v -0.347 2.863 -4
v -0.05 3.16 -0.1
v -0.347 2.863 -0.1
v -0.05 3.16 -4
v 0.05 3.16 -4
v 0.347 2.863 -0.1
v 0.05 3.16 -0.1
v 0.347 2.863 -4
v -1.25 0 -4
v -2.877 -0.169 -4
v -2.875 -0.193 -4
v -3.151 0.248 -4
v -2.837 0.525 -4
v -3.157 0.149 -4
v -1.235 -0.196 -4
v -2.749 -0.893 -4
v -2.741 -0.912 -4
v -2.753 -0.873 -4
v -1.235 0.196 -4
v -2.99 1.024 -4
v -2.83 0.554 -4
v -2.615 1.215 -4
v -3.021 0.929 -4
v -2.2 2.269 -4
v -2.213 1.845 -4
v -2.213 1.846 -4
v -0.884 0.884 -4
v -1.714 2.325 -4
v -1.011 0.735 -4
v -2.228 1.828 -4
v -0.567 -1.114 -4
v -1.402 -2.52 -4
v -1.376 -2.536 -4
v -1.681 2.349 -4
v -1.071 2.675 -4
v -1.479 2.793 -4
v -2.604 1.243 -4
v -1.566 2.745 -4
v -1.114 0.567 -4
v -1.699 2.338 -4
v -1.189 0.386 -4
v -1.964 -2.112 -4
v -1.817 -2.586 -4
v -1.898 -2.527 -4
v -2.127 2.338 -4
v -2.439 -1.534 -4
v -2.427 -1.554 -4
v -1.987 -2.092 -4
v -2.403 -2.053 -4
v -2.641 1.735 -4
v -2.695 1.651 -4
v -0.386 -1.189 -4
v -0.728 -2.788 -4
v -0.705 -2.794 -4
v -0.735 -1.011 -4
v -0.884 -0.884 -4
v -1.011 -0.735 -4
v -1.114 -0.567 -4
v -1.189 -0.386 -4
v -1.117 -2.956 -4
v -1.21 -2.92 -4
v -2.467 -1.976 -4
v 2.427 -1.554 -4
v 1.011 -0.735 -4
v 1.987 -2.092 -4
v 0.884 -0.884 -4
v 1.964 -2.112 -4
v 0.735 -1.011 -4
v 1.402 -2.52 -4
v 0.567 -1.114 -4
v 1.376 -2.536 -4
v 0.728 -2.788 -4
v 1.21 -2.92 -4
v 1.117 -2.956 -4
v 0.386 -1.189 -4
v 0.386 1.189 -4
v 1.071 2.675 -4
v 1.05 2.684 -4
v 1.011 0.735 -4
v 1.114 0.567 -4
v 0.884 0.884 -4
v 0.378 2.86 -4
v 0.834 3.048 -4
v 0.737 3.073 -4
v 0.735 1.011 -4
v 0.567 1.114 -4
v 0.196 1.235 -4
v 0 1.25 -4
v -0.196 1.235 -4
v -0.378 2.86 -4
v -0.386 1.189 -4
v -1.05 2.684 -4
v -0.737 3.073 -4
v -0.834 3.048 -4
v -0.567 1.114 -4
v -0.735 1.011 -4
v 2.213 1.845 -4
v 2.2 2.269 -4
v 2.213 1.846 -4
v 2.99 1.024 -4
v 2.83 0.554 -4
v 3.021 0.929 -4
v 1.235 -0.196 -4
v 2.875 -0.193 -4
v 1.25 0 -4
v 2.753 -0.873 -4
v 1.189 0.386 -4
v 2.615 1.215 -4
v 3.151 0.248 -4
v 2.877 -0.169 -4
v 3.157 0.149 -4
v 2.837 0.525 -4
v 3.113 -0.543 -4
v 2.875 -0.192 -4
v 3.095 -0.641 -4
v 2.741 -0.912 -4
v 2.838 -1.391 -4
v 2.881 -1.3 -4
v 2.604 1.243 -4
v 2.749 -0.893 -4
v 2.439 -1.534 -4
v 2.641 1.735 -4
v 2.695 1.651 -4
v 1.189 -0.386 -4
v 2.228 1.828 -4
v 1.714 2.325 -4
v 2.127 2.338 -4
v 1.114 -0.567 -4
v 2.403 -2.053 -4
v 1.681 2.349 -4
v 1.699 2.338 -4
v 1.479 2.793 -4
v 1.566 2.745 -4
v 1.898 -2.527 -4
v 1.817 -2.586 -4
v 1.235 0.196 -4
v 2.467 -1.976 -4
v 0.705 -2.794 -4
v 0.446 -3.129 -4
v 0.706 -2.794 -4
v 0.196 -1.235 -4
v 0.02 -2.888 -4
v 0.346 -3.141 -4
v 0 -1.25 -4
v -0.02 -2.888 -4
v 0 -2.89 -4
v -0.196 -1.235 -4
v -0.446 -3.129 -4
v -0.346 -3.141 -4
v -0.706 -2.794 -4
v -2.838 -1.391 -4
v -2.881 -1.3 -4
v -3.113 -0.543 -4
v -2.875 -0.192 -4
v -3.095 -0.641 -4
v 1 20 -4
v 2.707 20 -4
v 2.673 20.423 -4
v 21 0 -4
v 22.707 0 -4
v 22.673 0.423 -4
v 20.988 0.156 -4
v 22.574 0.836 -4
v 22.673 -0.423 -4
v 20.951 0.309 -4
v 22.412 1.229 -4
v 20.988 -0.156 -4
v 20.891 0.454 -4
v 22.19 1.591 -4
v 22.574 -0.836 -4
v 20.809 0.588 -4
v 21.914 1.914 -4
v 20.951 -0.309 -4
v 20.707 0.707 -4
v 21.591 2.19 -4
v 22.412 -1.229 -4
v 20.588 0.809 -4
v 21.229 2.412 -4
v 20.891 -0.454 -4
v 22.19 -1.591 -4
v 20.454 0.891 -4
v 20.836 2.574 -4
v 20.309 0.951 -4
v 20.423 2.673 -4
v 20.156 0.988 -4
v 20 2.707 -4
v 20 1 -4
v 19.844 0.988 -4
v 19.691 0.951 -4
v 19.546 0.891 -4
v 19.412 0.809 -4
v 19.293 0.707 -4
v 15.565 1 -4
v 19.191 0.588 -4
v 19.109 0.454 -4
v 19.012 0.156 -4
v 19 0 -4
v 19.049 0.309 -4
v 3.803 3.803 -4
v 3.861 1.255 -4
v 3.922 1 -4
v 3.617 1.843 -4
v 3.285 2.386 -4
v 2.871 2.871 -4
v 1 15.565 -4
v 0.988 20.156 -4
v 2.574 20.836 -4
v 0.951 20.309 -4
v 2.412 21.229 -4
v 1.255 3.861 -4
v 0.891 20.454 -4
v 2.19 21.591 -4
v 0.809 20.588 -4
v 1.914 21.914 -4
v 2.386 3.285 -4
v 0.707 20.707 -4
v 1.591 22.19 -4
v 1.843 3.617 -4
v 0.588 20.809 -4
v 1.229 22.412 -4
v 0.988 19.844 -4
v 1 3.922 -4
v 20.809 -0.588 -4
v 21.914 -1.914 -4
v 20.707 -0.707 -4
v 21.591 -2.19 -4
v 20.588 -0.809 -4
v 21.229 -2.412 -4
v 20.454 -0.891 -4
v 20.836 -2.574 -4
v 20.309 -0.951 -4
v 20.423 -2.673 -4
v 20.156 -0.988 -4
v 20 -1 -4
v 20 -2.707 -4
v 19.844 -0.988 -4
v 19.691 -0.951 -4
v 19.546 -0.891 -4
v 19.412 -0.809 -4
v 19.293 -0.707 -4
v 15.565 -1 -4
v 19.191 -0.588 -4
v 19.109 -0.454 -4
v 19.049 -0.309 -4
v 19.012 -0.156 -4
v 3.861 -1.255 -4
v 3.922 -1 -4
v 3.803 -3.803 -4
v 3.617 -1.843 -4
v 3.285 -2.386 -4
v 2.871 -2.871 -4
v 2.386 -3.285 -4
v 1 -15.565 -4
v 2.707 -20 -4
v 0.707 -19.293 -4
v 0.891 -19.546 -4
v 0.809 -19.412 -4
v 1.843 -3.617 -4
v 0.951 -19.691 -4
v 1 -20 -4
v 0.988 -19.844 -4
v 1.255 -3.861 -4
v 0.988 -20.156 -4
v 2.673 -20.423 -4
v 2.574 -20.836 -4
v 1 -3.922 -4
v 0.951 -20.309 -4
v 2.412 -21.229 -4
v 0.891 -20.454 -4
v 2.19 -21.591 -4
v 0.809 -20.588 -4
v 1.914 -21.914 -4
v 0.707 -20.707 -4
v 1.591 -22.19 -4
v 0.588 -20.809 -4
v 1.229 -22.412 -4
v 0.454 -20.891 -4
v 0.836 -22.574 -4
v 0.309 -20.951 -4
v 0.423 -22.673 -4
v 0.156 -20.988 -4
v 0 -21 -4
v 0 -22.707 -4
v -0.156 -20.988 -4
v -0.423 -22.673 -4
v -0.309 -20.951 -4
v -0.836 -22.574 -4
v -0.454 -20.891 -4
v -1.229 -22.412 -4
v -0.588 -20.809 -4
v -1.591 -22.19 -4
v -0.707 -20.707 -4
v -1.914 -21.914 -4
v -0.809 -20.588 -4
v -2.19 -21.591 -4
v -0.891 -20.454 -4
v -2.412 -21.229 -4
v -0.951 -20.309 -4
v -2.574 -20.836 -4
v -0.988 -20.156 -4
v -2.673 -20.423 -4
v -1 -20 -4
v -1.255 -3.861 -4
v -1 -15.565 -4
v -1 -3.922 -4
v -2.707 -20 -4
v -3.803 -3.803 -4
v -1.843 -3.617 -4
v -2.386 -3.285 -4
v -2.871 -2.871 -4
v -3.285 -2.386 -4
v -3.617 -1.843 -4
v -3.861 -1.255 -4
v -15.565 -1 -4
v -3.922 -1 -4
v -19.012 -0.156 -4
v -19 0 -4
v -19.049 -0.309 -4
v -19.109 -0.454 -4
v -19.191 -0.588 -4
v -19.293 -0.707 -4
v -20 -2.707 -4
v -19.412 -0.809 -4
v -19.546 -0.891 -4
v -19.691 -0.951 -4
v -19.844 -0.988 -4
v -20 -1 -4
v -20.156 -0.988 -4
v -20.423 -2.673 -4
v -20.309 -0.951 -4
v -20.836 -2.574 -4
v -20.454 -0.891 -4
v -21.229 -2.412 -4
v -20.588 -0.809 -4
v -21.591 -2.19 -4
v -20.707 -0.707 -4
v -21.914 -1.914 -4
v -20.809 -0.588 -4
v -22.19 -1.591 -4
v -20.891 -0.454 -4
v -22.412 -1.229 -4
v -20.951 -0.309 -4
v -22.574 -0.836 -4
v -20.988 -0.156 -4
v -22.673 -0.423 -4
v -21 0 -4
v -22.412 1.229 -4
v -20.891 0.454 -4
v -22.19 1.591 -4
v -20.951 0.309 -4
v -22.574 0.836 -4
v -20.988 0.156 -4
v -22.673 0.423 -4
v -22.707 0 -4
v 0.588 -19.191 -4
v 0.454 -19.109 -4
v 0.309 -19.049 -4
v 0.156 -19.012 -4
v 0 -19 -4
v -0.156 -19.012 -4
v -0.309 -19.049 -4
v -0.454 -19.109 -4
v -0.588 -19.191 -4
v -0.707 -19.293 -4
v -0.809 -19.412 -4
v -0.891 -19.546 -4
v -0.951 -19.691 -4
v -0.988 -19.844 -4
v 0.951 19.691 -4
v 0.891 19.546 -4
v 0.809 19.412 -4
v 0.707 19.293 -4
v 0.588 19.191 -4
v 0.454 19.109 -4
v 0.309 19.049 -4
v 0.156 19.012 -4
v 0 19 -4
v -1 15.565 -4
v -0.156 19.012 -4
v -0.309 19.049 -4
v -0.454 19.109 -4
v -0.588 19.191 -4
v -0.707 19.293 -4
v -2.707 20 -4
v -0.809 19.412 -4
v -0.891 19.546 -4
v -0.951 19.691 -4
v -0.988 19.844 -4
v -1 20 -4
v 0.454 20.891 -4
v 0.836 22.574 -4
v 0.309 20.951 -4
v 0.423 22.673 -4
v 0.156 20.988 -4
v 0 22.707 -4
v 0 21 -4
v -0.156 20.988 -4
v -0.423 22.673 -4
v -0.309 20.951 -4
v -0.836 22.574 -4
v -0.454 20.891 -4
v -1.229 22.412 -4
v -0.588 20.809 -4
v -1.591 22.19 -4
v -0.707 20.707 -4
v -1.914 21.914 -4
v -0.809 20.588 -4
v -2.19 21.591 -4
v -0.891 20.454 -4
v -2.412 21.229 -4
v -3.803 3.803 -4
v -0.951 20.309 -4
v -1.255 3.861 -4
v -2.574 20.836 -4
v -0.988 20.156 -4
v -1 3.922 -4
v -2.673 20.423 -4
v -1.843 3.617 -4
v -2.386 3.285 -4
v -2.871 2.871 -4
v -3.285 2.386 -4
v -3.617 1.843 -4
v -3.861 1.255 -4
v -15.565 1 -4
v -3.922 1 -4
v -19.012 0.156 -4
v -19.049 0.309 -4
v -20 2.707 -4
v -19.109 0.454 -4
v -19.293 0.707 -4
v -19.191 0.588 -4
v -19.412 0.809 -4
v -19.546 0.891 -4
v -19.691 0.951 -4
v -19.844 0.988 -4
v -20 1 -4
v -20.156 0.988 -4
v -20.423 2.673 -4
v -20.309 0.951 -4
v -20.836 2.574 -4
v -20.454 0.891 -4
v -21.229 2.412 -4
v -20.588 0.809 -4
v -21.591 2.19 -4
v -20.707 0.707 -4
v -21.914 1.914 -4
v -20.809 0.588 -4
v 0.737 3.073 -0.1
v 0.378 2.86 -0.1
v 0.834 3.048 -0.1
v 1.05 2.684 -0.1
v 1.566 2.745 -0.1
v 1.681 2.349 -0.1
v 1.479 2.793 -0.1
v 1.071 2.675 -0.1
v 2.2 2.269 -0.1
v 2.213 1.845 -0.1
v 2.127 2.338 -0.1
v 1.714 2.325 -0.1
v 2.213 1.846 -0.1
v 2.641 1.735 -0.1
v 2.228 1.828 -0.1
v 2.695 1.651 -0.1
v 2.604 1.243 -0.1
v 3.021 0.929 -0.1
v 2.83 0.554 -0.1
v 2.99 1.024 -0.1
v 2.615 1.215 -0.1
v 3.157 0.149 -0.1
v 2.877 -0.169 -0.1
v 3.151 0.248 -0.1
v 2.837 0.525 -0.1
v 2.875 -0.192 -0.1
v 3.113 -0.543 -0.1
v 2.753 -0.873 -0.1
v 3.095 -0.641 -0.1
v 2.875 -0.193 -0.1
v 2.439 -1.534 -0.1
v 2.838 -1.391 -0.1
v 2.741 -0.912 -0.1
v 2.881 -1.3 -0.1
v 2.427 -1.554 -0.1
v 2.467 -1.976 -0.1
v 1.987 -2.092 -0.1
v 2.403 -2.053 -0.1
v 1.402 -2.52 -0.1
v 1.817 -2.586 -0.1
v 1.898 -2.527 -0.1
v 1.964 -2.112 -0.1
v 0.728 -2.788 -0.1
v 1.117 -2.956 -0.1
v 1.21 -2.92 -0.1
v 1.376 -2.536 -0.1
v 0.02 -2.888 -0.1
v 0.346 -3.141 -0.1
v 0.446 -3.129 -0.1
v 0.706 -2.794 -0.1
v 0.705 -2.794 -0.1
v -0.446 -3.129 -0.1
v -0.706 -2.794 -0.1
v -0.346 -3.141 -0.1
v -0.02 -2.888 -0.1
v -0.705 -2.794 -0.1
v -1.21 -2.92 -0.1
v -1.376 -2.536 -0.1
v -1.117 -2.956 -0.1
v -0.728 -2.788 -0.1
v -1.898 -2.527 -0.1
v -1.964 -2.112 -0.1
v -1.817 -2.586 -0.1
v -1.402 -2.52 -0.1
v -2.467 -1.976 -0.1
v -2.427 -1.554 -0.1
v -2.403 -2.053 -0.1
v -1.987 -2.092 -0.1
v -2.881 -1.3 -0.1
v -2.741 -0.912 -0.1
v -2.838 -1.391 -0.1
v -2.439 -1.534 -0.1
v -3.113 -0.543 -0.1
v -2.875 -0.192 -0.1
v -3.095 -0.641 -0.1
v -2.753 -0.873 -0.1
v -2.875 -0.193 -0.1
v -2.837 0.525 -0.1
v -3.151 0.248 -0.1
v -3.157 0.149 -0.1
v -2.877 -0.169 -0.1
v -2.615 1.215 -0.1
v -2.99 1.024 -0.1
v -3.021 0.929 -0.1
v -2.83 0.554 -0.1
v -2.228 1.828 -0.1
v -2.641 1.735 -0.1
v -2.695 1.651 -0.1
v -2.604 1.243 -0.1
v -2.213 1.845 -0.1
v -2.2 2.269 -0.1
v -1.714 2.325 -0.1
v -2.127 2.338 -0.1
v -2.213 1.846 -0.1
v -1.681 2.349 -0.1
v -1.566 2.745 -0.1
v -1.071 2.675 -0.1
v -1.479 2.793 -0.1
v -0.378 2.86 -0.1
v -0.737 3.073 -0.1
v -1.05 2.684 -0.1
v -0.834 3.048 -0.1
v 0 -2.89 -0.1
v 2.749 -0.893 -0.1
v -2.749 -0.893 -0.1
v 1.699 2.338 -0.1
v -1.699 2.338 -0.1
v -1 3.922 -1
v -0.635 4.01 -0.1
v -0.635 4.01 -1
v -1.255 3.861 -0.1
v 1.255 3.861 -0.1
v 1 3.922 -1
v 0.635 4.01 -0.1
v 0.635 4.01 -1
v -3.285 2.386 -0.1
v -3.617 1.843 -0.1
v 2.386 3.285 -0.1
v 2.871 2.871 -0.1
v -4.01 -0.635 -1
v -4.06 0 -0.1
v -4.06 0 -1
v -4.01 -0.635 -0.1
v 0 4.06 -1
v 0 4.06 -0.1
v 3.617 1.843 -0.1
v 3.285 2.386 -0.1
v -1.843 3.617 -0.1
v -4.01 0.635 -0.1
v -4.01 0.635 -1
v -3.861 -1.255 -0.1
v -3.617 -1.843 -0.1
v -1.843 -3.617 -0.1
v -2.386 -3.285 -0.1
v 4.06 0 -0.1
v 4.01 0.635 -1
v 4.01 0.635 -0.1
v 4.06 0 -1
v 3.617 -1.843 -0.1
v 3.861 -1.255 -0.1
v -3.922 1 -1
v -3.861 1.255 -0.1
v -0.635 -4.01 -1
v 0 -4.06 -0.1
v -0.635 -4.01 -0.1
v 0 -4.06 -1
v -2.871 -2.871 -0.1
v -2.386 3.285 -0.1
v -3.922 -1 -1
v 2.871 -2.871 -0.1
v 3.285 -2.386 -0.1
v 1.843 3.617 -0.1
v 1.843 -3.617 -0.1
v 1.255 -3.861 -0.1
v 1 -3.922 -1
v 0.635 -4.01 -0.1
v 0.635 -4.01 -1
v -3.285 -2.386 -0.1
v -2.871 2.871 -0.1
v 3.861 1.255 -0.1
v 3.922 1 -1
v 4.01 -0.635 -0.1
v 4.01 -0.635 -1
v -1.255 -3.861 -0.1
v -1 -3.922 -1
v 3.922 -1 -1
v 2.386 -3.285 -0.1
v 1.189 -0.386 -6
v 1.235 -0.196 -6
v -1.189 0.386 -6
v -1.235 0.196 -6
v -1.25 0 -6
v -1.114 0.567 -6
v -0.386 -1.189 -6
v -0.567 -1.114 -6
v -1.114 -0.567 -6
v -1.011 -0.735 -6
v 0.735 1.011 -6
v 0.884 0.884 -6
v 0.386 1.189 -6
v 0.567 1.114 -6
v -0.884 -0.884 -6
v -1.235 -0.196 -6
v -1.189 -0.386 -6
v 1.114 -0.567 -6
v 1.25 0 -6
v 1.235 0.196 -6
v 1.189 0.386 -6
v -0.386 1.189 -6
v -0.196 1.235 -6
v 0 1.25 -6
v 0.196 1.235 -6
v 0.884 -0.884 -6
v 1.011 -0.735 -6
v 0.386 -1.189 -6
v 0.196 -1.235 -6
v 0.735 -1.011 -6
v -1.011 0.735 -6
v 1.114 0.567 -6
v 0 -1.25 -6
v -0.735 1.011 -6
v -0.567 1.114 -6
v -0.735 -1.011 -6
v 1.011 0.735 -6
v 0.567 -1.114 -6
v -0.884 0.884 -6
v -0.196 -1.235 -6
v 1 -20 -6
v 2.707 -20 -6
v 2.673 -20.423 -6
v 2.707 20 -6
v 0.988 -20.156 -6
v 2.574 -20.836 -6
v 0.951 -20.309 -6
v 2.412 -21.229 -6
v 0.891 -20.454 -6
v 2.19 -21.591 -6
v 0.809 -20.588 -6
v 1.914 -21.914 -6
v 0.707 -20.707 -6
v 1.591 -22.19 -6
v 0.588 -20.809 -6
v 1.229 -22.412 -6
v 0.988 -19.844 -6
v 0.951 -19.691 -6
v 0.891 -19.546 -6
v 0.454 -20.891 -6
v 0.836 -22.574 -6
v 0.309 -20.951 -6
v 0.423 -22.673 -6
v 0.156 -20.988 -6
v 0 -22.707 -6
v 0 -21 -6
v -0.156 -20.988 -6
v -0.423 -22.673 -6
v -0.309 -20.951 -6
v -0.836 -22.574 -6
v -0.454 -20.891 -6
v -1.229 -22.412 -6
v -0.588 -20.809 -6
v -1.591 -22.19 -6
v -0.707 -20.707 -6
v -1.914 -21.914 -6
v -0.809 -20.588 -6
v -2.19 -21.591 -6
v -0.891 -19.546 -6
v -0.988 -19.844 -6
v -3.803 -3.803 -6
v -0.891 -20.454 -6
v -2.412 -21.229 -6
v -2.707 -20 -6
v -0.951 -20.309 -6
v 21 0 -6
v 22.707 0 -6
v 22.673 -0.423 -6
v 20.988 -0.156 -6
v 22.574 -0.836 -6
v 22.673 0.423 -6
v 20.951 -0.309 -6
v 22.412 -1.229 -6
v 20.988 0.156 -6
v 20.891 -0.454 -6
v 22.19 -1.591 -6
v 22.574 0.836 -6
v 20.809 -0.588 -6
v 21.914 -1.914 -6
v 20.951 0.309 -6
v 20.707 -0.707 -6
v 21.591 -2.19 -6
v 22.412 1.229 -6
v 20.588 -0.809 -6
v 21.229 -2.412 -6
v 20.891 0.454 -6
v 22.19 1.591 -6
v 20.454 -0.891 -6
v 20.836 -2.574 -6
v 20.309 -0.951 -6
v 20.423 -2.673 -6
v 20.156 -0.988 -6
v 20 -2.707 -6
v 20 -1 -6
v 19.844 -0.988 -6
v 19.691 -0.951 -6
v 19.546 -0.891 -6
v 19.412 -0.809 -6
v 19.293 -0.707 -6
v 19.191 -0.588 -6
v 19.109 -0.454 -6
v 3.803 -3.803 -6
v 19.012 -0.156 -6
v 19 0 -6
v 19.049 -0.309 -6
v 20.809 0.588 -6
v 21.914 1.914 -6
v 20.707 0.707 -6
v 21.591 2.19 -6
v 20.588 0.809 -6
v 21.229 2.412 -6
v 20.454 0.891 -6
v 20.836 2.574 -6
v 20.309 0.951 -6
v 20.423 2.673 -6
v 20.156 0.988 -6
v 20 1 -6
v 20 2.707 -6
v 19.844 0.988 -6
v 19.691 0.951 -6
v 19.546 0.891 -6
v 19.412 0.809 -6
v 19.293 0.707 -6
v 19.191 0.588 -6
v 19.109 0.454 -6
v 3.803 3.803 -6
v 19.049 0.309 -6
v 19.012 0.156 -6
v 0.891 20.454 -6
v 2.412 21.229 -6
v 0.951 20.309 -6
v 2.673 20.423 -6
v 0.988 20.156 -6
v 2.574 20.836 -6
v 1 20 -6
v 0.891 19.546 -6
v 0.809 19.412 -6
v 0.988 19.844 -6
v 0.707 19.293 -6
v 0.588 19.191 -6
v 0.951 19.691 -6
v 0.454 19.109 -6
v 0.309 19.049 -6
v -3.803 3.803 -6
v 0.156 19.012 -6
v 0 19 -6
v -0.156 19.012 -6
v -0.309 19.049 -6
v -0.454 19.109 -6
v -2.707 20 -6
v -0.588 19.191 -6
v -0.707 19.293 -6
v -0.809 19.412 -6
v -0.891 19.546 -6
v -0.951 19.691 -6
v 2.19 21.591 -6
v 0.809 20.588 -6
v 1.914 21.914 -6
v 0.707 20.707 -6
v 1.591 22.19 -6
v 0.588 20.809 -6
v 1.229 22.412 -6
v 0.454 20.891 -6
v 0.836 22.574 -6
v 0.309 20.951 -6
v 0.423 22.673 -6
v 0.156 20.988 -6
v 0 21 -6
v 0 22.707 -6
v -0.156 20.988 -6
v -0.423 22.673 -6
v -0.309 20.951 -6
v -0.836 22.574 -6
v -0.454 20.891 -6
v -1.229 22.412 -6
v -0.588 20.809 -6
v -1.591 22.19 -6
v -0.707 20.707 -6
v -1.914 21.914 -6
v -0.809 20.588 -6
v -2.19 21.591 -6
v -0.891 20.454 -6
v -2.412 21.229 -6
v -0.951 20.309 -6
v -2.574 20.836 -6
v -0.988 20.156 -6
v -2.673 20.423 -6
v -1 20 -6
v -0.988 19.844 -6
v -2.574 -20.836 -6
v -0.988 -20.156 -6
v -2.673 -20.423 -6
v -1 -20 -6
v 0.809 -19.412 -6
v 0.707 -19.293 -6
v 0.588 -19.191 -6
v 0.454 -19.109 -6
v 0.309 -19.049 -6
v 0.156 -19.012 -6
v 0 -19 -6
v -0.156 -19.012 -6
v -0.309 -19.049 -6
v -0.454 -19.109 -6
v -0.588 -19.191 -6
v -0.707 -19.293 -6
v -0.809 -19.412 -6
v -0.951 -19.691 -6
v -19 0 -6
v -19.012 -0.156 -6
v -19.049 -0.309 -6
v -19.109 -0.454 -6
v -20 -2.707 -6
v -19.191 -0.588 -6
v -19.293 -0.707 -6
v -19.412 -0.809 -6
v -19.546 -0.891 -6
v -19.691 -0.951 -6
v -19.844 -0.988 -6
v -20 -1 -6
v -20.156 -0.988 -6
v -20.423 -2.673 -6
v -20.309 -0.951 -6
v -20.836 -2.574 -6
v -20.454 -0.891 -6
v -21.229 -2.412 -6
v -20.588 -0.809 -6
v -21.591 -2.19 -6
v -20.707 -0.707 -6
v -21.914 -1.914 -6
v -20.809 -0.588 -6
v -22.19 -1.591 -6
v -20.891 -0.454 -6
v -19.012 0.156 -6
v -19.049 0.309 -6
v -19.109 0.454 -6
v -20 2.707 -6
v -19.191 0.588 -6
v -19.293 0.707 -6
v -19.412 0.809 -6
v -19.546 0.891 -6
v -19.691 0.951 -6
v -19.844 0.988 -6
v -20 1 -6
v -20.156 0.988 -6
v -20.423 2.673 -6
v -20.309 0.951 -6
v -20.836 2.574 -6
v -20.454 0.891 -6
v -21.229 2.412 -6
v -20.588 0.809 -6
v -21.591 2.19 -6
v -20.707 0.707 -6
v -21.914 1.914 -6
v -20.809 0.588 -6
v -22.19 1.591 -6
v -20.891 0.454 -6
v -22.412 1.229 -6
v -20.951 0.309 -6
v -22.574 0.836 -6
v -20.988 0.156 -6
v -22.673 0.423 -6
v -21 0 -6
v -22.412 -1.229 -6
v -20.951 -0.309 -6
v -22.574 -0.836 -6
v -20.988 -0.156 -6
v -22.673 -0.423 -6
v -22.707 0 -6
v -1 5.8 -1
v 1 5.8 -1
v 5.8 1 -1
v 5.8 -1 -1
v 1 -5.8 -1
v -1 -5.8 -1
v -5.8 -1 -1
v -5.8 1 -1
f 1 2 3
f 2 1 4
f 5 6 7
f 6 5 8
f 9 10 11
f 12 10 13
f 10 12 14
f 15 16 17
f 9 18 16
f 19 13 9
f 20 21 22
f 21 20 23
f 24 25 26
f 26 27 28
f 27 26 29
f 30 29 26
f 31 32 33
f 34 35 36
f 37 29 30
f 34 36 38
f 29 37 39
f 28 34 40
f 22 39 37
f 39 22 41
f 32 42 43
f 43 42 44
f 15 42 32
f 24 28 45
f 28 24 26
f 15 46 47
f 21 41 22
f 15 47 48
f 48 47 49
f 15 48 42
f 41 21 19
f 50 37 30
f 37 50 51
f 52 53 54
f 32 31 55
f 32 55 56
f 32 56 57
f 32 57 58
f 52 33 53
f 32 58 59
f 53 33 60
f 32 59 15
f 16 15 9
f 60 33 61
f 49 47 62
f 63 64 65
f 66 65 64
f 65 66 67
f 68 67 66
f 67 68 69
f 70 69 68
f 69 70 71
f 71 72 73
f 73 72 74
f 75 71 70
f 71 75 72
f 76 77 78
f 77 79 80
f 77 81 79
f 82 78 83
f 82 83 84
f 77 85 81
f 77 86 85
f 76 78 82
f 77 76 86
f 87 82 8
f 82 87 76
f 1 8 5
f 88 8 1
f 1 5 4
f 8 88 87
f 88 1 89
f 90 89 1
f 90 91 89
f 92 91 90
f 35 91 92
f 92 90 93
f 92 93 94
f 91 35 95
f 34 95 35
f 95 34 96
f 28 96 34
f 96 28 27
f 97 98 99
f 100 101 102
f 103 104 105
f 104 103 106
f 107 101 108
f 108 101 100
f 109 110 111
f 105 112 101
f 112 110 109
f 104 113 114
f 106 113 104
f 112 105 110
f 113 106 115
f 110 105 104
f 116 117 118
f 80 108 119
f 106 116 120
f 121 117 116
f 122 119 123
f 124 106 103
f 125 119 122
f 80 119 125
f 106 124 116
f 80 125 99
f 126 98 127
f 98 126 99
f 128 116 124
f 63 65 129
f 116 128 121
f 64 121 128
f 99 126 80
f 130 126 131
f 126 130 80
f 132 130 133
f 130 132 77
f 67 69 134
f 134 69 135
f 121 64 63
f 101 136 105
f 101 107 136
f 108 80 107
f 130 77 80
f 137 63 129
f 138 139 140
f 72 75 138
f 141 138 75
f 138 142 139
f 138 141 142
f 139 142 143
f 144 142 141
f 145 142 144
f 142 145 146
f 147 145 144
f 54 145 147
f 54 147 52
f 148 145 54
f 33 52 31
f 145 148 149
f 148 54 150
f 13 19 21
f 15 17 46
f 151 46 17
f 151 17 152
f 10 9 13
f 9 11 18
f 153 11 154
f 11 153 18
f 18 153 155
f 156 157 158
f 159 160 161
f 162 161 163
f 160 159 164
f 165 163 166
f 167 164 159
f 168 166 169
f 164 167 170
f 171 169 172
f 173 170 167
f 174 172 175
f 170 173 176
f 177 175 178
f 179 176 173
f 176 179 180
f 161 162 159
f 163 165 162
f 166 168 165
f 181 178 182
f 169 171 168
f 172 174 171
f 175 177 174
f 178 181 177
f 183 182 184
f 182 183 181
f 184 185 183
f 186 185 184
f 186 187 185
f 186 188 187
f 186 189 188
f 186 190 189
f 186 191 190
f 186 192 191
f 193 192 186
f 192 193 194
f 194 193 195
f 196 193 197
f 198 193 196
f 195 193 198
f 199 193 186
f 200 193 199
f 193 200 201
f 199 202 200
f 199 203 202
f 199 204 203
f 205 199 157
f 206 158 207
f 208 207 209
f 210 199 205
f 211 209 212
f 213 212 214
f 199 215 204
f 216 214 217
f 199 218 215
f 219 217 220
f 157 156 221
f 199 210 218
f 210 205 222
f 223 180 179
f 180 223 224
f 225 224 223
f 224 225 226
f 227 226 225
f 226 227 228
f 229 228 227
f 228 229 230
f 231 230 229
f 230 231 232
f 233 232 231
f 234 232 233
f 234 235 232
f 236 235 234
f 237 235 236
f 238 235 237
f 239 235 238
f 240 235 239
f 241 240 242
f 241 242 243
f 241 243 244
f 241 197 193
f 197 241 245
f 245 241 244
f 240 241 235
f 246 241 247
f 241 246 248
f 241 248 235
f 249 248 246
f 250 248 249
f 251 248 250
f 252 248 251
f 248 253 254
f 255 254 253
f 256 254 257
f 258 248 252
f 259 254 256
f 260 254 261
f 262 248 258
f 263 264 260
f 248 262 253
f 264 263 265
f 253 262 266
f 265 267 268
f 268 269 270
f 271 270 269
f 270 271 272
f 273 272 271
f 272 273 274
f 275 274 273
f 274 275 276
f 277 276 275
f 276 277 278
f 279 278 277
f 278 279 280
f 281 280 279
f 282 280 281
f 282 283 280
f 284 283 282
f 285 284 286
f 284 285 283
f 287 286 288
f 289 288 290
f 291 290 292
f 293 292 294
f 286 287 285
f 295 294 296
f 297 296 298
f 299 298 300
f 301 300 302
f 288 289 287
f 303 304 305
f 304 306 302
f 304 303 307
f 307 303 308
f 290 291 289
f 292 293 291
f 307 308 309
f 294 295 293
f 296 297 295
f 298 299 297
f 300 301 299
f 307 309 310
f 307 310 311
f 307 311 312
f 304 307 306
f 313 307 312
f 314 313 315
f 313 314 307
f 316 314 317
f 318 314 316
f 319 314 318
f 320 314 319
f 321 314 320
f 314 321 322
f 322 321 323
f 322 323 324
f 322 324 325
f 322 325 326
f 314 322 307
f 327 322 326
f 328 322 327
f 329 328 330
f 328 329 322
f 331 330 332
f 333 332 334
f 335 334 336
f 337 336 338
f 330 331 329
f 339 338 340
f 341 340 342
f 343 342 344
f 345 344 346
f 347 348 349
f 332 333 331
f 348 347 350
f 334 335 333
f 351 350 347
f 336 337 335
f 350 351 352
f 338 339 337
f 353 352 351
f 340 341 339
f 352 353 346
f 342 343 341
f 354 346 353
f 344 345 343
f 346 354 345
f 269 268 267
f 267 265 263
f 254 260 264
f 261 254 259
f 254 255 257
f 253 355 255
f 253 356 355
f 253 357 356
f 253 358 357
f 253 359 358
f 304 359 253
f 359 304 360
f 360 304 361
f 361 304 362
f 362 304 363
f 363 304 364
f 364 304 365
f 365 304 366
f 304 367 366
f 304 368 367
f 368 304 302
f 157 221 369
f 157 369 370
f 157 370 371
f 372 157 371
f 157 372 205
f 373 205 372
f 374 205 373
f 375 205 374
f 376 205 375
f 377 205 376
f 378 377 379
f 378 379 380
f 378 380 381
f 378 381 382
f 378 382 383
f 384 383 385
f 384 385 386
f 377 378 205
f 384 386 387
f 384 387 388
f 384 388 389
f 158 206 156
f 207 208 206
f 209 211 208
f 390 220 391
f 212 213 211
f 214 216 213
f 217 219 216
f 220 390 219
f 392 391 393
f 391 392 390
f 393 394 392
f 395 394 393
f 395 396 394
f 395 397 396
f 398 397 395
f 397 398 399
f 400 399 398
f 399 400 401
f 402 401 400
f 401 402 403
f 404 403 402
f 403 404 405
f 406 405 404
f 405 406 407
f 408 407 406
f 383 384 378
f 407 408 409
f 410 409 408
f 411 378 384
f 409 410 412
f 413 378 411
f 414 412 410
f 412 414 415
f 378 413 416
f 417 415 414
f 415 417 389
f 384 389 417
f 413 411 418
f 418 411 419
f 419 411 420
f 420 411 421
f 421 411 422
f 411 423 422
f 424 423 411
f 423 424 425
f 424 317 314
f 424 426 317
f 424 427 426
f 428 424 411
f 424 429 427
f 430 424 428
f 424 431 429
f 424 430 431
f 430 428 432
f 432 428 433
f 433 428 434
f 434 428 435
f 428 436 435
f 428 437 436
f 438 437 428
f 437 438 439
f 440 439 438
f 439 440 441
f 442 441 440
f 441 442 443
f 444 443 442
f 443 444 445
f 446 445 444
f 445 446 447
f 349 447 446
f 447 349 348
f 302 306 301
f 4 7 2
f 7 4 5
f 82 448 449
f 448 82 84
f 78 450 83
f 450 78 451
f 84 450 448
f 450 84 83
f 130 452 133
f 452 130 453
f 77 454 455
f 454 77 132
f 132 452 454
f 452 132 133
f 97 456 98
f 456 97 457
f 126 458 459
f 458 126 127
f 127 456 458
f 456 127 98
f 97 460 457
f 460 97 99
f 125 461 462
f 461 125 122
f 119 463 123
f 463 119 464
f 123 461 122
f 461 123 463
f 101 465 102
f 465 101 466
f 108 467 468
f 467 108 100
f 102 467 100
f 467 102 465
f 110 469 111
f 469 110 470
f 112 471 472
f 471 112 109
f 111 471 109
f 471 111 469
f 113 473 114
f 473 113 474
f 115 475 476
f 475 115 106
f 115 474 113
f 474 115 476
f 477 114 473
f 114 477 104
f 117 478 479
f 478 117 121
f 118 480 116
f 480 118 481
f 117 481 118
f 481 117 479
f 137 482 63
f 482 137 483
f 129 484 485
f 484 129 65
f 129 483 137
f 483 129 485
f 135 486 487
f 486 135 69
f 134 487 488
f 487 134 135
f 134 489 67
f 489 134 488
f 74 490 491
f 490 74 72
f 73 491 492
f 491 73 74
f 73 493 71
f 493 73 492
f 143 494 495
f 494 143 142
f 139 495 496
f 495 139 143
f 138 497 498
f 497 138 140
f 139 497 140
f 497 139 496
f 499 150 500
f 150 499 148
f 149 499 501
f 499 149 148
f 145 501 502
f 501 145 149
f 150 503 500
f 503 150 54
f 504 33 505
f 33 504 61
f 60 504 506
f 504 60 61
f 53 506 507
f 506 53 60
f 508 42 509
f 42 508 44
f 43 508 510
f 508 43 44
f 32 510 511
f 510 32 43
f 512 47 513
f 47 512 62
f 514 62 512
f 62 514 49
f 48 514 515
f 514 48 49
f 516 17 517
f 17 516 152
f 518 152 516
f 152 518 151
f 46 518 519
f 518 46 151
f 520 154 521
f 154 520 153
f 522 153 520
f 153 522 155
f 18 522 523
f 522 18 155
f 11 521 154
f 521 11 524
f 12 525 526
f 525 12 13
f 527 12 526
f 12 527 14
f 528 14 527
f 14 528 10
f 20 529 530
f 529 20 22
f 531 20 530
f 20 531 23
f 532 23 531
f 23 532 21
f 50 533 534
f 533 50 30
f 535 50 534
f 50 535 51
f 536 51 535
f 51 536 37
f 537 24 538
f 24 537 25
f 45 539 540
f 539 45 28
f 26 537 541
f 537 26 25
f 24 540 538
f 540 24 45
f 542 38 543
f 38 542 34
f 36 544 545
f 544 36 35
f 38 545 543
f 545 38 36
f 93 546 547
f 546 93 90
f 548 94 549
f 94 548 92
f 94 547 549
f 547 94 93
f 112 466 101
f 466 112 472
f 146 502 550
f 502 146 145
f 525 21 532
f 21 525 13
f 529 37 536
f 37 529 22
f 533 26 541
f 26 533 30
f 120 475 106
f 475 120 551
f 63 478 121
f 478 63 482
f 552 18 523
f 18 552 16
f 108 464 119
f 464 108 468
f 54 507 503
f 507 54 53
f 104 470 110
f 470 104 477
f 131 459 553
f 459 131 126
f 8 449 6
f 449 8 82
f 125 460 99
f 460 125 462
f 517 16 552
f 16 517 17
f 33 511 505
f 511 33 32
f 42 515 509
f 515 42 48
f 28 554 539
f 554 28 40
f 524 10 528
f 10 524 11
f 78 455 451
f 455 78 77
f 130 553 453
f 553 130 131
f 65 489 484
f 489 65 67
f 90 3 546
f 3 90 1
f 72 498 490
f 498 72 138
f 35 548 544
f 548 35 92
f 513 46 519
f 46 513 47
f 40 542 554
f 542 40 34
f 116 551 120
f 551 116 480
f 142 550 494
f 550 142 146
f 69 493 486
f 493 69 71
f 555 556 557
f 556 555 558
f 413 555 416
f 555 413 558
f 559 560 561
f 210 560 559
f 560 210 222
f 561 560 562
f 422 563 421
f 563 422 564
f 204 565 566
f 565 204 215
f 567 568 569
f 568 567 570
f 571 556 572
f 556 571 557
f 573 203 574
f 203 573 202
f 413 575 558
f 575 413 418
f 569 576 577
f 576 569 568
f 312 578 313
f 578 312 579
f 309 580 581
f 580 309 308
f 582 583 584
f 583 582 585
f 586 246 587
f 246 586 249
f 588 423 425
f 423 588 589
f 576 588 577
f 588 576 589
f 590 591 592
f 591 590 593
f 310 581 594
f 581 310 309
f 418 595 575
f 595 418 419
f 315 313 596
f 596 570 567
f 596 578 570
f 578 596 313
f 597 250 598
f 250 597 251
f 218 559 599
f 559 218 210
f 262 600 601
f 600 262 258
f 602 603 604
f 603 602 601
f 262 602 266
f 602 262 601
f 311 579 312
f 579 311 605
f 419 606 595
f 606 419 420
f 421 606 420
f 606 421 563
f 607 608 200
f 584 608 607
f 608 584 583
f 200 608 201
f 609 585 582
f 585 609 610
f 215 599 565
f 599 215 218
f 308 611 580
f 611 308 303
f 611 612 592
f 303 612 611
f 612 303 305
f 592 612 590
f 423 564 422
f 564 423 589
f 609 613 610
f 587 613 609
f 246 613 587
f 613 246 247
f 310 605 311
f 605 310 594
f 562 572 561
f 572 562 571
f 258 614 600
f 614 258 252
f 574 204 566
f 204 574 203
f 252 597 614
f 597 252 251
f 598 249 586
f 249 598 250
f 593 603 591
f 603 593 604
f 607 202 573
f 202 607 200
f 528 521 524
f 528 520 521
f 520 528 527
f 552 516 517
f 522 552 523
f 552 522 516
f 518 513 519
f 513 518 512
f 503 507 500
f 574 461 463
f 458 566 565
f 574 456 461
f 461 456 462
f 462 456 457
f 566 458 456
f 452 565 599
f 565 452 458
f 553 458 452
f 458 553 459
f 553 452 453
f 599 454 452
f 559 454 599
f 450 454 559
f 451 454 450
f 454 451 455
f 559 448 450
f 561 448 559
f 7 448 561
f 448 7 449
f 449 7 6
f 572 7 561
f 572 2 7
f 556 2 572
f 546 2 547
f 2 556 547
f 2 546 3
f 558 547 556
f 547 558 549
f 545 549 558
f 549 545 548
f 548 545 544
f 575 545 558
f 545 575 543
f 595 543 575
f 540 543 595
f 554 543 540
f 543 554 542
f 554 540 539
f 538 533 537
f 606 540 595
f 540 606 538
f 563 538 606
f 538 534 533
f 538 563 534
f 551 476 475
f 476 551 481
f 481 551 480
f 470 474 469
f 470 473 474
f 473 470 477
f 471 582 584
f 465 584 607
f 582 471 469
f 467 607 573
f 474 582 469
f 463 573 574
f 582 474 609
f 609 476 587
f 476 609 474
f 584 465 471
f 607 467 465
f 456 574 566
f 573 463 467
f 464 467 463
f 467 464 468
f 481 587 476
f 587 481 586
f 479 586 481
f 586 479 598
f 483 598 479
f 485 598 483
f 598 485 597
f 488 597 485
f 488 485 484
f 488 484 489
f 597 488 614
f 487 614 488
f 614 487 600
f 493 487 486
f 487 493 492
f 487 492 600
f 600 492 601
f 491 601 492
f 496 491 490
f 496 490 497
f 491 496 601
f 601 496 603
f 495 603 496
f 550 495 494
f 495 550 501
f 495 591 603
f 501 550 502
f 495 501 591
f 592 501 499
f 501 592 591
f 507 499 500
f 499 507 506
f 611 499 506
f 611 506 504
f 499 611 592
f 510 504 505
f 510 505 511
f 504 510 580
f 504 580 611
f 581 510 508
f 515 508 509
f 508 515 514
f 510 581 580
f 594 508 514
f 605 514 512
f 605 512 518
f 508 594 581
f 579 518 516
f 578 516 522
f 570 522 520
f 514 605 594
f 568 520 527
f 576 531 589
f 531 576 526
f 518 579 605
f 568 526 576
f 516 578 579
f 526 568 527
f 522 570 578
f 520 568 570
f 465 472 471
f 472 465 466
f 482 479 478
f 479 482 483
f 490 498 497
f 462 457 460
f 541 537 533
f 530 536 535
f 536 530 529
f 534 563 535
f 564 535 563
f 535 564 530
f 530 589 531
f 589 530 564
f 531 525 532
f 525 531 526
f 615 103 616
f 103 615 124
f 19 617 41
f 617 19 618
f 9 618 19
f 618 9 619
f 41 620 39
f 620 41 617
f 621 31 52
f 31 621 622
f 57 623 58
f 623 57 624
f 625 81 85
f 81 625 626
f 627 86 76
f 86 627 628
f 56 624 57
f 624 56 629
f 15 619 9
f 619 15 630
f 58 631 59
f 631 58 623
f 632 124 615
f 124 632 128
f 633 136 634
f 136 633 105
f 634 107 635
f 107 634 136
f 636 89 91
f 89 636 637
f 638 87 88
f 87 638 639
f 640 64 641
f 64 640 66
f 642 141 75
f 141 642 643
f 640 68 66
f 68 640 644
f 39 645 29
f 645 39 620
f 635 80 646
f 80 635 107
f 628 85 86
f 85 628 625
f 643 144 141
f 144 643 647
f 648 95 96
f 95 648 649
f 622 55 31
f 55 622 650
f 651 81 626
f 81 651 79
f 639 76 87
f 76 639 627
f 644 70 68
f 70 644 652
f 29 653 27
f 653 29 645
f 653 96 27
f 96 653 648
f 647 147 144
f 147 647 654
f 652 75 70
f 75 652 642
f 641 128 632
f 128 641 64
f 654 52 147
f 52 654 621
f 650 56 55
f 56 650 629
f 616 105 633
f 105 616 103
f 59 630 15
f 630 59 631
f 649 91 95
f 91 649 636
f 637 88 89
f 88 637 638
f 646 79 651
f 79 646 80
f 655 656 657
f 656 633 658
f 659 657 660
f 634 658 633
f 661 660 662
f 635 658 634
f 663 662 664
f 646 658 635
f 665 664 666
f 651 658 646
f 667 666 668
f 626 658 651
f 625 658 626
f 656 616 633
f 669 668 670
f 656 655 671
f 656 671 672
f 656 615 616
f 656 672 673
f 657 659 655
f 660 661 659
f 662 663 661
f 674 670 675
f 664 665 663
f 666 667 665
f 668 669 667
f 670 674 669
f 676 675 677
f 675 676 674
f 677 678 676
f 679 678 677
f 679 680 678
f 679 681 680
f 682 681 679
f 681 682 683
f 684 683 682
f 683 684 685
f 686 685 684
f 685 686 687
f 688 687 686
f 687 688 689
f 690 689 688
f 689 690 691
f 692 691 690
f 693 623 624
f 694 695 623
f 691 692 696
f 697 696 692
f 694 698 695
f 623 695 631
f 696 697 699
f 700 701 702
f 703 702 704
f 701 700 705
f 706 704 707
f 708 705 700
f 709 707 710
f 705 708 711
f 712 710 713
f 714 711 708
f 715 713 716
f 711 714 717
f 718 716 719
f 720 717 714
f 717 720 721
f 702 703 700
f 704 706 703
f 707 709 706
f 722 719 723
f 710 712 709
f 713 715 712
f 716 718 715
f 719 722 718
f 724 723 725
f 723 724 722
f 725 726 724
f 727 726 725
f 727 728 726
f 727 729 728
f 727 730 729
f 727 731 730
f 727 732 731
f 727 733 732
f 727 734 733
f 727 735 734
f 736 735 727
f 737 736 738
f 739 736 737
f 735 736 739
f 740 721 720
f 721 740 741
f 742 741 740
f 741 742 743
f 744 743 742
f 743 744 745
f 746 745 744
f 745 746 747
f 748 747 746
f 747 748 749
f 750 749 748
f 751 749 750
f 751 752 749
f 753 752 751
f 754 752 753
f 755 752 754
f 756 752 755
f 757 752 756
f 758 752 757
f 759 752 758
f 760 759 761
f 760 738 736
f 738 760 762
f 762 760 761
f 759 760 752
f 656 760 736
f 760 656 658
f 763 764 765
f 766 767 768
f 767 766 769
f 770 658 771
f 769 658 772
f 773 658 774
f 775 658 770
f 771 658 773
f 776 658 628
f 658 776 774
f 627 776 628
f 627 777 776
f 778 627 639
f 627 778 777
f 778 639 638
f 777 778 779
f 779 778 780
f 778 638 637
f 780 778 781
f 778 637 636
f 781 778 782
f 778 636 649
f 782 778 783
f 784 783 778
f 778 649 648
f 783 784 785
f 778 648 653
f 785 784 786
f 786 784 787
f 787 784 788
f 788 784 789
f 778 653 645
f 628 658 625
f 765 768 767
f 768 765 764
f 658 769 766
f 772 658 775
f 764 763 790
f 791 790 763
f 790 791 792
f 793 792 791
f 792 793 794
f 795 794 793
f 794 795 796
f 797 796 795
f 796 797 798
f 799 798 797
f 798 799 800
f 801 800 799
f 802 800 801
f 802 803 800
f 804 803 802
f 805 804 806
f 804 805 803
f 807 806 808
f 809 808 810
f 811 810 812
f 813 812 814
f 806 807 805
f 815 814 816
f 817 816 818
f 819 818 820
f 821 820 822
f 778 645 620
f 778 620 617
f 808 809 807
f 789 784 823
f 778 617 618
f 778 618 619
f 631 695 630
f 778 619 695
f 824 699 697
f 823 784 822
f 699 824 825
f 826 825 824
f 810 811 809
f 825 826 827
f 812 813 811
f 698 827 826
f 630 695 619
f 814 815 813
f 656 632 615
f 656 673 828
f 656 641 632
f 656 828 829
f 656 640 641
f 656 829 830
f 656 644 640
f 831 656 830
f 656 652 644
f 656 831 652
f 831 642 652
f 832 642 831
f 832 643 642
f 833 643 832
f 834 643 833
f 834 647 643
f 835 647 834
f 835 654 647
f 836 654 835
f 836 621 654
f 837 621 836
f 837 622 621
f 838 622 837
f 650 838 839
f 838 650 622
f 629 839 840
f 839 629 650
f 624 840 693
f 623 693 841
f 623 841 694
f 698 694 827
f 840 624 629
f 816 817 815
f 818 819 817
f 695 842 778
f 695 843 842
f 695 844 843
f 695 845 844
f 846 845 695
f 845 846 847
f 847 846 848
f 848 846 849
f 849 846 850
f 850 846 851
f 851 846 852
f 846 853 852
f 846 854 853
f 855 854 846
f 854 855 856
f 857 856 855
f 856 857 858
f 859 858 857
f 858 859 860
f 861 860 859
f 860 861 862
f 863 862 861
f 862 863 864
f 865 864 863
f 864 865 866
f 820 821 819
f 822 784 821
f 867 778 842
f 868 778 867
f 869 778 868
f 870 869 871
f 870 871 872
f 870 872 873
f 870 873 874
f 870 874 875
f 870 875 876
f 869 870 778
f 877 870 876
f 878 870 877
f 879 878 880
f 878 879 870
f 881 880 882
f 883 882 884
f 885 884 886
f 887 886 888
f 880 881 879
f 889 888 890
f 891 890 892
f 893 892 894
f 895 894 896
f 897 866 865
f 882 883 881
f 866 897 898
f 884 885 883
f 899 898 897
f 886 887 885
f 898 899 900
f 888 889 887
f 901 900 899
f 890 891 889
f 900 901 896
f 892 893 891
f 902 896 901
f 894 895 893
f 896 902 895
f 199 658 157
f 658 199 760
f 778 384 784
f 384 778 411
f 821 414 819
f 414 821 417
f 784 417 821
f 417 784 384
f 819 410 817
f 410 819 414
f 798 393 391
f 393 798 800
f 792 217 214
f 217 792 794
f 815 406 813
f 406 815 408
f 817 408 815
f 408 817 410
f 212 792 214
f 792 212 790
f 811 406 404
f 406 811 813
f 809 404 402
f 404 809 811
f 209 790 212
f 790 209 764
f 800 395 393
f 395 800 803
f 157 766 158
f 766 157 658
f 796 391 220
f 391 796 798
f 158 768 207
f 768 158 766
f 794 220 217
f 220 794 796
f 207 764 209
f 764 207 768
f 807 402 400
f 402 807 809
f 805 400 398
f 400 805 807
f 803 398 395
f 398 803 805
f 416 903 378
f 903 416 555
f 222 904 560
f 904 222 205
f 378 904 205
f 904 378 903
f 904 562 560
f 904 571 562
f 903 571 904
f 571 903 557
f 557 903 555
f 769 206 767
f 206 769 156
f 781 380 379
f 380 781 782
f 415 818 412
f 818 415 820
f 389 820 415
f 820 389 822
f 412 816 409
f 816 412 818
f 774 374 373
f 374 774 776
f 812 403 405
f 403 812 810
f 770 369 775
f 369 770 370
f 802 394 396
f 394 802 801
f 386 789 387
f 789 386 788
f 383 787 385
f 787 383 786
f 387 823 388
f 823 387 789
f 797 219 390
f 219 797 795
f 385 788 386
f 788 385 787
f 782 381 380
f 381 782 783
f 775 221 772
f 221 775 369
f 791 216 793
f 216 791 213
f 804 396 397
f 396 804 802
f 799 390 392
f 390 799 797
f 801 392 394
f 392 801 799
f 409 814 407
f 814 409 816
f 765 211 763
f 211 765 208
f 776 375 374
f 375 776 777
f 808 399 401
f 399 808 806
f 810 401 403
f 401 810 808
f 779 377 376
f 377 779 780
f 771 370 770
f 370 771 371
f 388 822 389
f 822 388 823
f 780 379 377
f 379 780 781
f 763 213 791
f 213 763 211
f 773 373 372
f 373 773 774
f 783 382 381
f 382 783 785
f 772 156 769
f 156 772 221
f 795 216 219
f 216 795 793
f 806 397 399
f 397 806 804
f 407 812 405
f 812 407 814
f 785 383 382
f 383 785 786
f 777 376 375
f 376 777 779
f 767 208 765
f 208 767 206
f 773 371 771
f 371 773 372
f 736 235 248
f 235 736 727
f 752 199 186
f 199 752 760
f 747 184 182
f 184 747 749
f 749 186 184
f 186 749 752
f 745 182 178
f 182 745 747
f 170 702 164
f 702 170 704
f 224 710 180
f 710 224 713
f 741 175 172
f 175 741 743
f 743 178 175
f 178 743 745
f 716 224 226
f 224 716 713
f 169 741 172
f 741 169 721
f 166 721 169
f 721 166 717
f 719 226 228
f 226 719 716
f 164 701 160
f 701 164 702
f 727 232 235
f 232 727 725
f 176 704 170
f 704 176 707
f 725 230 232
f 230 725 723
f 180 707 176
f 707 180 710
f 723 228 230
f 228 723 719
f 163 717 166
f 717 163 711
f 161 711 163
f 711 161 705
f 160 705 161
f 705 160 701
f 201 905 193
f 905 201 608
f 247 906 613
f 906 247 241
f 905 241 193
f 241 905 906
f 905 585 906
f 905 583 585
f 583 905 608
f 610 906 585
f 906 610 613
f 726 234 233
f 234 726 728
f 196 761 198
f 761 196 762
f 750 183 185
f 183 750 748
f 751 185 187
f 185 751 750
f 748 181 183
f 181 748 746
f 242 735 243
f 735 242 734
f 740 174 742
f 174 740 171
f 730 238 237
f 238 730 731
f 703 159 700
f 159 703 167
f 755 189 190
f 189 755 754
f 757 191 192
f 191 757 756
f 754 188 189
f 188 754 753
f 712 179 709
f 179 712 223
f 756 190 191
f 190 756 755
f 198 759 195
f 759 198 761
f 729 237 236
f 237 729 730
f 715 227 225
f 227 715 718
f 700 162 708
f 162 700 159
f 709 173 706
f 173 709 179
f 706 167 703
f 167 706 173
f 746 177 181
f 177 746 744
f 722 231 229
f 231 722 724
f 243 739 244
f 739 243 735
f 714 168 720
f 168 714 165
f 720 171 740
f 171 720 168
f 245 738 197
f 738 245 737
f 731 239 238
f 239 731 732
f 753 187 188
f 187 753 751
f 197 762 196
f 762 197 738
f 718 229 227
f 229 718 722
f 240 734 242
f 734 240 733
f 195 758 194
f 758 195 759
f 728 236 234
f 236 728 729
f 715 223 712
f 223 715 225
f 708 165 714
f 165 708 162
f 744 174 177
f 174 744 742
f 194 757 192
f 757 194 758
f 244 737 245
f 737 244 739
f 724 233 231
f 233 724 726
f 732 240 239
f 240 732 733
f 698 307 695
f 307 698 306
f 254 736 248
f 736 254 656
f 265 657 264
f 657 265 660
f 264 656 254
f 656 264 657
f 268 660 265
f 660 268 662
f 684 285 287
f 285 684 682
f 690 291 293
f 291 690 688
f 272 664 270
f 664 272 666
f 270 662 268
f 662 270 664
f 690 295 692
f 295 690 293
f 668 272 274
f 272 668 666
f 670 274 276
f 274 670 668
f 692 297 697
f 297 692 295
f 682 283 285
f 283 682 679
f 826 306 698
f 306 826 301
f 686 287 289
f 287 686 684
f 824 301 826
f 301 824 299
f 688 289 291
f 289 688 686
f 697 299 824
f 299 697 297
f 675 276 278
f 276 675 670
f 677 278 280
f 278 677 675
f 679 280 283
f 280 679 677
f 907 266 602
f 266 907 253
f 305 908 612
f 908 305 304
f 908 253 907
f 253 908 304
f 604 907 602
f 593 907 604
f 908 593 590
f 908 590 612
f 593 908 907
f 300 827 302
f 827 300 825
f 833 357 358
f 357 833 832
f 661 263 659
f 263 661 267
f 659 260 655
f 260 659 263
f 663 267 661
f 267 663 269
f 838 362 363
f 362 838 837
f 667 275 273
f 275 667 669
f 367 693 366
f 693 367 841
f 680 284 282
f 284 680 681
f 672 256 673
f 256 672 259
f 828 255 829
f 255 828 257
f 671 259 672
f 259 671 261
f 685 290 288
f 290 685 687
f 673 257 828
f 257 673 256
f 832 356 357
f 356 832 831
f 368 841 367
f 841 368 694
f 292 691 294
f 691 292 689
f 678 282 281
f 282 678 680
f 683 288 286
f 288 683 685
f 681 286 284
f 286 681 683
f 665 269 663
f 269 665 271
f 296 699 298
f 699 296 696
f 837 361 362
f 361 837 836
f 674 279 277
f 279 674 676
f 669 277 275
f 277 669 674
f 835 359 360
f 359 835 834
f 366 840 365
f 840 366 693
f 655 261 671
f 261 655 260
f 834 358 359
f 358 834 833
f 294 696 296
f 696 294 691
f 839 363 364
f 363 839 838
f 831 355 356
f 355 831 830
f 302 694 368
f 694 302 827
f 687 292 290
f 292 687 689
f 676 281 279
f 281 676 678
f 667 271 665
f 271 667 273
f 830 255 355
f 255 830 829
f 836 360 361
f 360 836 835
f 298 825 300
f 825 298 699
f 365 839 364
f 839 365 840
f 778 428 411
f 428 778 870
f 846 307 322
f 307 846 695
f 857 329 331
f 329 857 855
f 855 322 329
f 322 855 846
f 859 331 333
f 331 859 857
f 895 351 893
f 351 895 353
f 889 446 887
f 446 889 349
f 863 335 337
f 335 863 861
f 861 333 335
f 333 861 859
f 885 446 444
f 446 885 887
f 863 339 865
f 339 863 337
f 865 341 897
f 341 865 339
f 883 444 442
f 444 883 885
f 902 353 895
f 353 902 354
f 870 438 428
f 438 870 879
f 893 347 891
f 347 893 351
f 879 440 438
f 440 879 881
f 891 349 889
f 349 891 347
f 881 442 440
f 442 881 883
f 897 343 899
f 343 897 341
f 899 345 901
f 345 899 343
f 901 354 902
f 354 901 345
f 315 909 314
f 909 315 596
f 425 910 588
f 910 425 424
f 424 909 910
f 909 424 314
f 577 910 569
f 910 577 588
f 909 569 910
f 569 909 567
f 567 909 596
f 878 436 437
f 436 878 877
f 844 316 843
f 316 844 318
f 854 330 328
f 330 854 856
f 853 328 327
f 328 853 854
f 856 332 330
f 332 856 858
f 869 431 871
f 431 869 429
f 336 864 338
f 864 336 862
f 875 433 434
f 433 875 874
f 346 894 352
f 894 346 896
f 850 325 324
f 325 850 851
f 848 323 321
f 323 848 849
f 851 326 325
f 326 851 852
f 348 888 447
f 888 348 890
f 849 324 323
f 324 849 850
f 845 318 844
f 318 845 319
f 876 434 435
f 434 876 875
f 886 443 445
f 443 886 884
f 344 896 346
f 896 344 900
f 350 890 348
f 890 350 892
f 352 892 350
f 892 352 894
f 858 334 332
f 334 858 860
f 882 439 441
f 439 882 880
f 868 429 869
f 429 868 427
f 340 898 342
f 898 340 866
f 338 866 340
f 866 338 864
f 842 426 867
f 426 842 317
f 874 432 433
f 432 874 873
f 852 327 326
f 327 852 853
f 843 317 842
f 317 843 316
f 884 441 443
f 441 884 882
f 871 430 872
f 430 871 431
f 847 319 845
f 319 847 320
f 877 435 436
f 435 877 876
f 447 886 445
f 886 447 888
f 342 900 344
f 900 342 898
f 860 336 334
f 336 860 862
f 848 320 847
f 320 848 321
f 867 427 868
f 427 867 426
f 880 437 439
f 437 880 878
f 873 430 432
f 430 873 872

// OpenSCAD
/**
 *  Parametric servo arm generator for OpenScad
 *  Générateur de palonnier de servo pour OpenScad
 *
 *  Copyright (c) 2012 Charles Rincheval.  All rights reserved.
 *
 *  This library is free software; you can redistribute it and/or
 *  modify it under the terms of the GNU Lesser General Public
 *  License as published by the Free Software Foundation; either
 *  version 2.1 of the License, or (at your option) any later version.
 *
 *  This library is distributed in the hope that it will be useful,
 *  but WITHOUT ANY WARRANTY; without even the implied warranty of
 *  MERCHANTABILITY or FITNESS FOR A PARTICULAR PURPOSE.  See the GNU
 *  Lesser General Public License for more details.
 *
 *  You should have received a copy of the GNU Lesser General Public
 *  License along with this library; if not, write to the Free Software
 *  Foundation, Inc., 51 Franklin St, Fifth Floor, Boston, MA  02110-1301  USA
 *
 *  Last update :
 *  https://github.com/hugokernel/OpenSCAD_ServoArms
 *
 *  http://www.digitalspirit.org/
 */

arm_length = 20;

arm_count = 4; // [1,2,3,4,5,6,7,8]

//  Clear between arm head and servo head (PLA: 0.3, ABS 0.2)
SERVO_HEAD_CLEAR = 0.2; // [0.2,0.3,0.4,0.5]

$fn = 40 / 1;

/**
 *  Head / Tooth parameters
 *  Futaba 3F Standard Spline
 *  http://www.servocity.com/html/futaba_servo_splines.html
 *
 *  First array (head related) :
 *  0. Head external diameter
 *  1. Head heigth
 *  2. Head thickness
 *  3. Head screw diameter
 *
 *  Second array (tooth related) :
 *  0. Tooth count
 *  1. Tooth height
 *  2. Tooth length
 *  3. Tooth width
 */
FUTABA_3F_SPLINE = [
    [5.92, 4, 1.1, 2.5],
    [25, 0.3, 0.7, 0.1]
];

module servo_futaba_3f(length, count) {
    servo_arm(FUTABA_3F_SPLINE, [length, count]);
}

/**
 *  If you want to support a new servo, juste add a new spline definition array
 *  and a module named like servo_XXX_YYY where XXX is servo brand and YYY is the
 *  connection type (3f) or the servo type (s3003)
 */

module servo_standard(length, count) {
    servo_futaba_3f(length, count);
}

/**
 *  Tooth
 *
 *    |<-w->|
 *    |_____|___
 *    /     \  ^h
 *  _/       \_v
 *   |<--l-->|
 *
 *  - tooth length (l)
 *  - tooth width (w)
 *  - tooth height (h)
 *  - height
 *
 */
module servo_head_tooth(length, width, height, head_height) {
    linear_extrude(height = head_height) {
        polygon([[-length / 2, 0], [-width / 2, height], [width / 2, height], [length / 2,0]]);
    }
}

/**
 *  Servo head
 */
module servo_head(params, clear = SERVO_HEAD_CLEAR) {

    head = params[0];
    tooth = params[1];

    head_diameter = head[0];
    head_heigth = head[1];

    tooth_count = tooth[0];
    tooth_height = tooth[1];
    tooth_length = tooth[2];
    tooth_width = tooth[3];

    % cylinder(r = head_diameter / 2, h = head_heigth + 1);

    cylinder(r = head_diameter / 2 - tooth_height + 0.03 + clear, h = head_heigth);

    for (i = [0 : tooth_count]) {
        rotate([0, 0, i * (360 / tooth_count)]) {
            translate([0, head_diameter / 2 - tooth_height + clear, 0]) {
                servo_head_tooth(tooth_length, tooth_width, tooth_height, head_heigth);
            }
        }
    }
}

/**
 *  Servo hold
 *  - Head / Tooth parameters
 *  - Arms params (length and count)
 */
module servo_arm(params, arms) {

    head = params[0];
    tooth = params[1];

    head_diameter = head[0];
    head_heigth = head[1];
    head_thickness = head[2];
    head_screw_diameter = head[3];

    tooth_length = tooth[2];
    tooth_width = tooth[3];

    arm_length = arms[0];
    arm_count = arms[1];

    /**
     *  Servo arm
     *  - length is from center to last hole
     */
    module arm(tooth_length, tooth_width, head_height, head_heigth, hole_count = 1) {

        arm_screw_diameter = 2;

        difference() {
            union() {
                cylinder(r = tooth_width / 2, h = head_heigth);

                linear_extrude(height = head_heigth) {
                    polygon([
                        [-tooth_width / 2, 0], [-tooth_width / 3, tooth_length],
                        [tooth_width / 3, tooth_length], [tooth_width / 2, 0]
                    ]);
                }

                translate([0, tooth_length, 0]) {
                    cylinder(r = tooth_width / 3, h = head_heigth);
                }

                if (tooth_length >= 12) {
                    translate([-head_heigth / 2 + 2, 3.8, -4]) {
                        rotate([90, 0, 0]) {
                            rotate([0, -90, 0]) {
                                linear_extrude(height = head_heigth) {
                                    polygon([
                                        [-tooth_length / 1.7, 4], [0, 4], [0, - head_height + 5],
                                        [-2, - head_height + 5]
                                    ]);
                                }
                            }
                        }
                    }
                }
            }

            // Hole
            for (i = [0 : hole_count - 1]) {
                //translate([0, length - (length / hole_count * i), -1]) {
                translate([0, tooth_length - (4 * i), -1]) {
                    cylinder(r = arm_screw_diameter / 2, h = 10);
                }
            }

            cylinder(r = head_screw_diameter / 2, h = 10);
        }
    }

    difference() {
        translate([0, 0, 0.1]) {
            cylinder(r = head_diameter / 2 + head_thickness, h = head_heigth + 1);
        }

        cylinder(r = head_screw_diameter / 2, h = 10);

        servo_head(params);
    }

    arm_thickness = head_thickness;

    // Arm
    translate([0, 0, head_heigth]) {
        for (i = [0 : arm_count - 1]) {
            rotate([0, 0, i * (360 / arm_count)]) {
                arm(arm_length, head_diameter + arm_thickness * 2, head_heigth, 2);
            }
        }
    }
}

module demo() {
    rotate([0, 180, 0])
        servo_standard(arm_length, arm_count);
}

demo();
